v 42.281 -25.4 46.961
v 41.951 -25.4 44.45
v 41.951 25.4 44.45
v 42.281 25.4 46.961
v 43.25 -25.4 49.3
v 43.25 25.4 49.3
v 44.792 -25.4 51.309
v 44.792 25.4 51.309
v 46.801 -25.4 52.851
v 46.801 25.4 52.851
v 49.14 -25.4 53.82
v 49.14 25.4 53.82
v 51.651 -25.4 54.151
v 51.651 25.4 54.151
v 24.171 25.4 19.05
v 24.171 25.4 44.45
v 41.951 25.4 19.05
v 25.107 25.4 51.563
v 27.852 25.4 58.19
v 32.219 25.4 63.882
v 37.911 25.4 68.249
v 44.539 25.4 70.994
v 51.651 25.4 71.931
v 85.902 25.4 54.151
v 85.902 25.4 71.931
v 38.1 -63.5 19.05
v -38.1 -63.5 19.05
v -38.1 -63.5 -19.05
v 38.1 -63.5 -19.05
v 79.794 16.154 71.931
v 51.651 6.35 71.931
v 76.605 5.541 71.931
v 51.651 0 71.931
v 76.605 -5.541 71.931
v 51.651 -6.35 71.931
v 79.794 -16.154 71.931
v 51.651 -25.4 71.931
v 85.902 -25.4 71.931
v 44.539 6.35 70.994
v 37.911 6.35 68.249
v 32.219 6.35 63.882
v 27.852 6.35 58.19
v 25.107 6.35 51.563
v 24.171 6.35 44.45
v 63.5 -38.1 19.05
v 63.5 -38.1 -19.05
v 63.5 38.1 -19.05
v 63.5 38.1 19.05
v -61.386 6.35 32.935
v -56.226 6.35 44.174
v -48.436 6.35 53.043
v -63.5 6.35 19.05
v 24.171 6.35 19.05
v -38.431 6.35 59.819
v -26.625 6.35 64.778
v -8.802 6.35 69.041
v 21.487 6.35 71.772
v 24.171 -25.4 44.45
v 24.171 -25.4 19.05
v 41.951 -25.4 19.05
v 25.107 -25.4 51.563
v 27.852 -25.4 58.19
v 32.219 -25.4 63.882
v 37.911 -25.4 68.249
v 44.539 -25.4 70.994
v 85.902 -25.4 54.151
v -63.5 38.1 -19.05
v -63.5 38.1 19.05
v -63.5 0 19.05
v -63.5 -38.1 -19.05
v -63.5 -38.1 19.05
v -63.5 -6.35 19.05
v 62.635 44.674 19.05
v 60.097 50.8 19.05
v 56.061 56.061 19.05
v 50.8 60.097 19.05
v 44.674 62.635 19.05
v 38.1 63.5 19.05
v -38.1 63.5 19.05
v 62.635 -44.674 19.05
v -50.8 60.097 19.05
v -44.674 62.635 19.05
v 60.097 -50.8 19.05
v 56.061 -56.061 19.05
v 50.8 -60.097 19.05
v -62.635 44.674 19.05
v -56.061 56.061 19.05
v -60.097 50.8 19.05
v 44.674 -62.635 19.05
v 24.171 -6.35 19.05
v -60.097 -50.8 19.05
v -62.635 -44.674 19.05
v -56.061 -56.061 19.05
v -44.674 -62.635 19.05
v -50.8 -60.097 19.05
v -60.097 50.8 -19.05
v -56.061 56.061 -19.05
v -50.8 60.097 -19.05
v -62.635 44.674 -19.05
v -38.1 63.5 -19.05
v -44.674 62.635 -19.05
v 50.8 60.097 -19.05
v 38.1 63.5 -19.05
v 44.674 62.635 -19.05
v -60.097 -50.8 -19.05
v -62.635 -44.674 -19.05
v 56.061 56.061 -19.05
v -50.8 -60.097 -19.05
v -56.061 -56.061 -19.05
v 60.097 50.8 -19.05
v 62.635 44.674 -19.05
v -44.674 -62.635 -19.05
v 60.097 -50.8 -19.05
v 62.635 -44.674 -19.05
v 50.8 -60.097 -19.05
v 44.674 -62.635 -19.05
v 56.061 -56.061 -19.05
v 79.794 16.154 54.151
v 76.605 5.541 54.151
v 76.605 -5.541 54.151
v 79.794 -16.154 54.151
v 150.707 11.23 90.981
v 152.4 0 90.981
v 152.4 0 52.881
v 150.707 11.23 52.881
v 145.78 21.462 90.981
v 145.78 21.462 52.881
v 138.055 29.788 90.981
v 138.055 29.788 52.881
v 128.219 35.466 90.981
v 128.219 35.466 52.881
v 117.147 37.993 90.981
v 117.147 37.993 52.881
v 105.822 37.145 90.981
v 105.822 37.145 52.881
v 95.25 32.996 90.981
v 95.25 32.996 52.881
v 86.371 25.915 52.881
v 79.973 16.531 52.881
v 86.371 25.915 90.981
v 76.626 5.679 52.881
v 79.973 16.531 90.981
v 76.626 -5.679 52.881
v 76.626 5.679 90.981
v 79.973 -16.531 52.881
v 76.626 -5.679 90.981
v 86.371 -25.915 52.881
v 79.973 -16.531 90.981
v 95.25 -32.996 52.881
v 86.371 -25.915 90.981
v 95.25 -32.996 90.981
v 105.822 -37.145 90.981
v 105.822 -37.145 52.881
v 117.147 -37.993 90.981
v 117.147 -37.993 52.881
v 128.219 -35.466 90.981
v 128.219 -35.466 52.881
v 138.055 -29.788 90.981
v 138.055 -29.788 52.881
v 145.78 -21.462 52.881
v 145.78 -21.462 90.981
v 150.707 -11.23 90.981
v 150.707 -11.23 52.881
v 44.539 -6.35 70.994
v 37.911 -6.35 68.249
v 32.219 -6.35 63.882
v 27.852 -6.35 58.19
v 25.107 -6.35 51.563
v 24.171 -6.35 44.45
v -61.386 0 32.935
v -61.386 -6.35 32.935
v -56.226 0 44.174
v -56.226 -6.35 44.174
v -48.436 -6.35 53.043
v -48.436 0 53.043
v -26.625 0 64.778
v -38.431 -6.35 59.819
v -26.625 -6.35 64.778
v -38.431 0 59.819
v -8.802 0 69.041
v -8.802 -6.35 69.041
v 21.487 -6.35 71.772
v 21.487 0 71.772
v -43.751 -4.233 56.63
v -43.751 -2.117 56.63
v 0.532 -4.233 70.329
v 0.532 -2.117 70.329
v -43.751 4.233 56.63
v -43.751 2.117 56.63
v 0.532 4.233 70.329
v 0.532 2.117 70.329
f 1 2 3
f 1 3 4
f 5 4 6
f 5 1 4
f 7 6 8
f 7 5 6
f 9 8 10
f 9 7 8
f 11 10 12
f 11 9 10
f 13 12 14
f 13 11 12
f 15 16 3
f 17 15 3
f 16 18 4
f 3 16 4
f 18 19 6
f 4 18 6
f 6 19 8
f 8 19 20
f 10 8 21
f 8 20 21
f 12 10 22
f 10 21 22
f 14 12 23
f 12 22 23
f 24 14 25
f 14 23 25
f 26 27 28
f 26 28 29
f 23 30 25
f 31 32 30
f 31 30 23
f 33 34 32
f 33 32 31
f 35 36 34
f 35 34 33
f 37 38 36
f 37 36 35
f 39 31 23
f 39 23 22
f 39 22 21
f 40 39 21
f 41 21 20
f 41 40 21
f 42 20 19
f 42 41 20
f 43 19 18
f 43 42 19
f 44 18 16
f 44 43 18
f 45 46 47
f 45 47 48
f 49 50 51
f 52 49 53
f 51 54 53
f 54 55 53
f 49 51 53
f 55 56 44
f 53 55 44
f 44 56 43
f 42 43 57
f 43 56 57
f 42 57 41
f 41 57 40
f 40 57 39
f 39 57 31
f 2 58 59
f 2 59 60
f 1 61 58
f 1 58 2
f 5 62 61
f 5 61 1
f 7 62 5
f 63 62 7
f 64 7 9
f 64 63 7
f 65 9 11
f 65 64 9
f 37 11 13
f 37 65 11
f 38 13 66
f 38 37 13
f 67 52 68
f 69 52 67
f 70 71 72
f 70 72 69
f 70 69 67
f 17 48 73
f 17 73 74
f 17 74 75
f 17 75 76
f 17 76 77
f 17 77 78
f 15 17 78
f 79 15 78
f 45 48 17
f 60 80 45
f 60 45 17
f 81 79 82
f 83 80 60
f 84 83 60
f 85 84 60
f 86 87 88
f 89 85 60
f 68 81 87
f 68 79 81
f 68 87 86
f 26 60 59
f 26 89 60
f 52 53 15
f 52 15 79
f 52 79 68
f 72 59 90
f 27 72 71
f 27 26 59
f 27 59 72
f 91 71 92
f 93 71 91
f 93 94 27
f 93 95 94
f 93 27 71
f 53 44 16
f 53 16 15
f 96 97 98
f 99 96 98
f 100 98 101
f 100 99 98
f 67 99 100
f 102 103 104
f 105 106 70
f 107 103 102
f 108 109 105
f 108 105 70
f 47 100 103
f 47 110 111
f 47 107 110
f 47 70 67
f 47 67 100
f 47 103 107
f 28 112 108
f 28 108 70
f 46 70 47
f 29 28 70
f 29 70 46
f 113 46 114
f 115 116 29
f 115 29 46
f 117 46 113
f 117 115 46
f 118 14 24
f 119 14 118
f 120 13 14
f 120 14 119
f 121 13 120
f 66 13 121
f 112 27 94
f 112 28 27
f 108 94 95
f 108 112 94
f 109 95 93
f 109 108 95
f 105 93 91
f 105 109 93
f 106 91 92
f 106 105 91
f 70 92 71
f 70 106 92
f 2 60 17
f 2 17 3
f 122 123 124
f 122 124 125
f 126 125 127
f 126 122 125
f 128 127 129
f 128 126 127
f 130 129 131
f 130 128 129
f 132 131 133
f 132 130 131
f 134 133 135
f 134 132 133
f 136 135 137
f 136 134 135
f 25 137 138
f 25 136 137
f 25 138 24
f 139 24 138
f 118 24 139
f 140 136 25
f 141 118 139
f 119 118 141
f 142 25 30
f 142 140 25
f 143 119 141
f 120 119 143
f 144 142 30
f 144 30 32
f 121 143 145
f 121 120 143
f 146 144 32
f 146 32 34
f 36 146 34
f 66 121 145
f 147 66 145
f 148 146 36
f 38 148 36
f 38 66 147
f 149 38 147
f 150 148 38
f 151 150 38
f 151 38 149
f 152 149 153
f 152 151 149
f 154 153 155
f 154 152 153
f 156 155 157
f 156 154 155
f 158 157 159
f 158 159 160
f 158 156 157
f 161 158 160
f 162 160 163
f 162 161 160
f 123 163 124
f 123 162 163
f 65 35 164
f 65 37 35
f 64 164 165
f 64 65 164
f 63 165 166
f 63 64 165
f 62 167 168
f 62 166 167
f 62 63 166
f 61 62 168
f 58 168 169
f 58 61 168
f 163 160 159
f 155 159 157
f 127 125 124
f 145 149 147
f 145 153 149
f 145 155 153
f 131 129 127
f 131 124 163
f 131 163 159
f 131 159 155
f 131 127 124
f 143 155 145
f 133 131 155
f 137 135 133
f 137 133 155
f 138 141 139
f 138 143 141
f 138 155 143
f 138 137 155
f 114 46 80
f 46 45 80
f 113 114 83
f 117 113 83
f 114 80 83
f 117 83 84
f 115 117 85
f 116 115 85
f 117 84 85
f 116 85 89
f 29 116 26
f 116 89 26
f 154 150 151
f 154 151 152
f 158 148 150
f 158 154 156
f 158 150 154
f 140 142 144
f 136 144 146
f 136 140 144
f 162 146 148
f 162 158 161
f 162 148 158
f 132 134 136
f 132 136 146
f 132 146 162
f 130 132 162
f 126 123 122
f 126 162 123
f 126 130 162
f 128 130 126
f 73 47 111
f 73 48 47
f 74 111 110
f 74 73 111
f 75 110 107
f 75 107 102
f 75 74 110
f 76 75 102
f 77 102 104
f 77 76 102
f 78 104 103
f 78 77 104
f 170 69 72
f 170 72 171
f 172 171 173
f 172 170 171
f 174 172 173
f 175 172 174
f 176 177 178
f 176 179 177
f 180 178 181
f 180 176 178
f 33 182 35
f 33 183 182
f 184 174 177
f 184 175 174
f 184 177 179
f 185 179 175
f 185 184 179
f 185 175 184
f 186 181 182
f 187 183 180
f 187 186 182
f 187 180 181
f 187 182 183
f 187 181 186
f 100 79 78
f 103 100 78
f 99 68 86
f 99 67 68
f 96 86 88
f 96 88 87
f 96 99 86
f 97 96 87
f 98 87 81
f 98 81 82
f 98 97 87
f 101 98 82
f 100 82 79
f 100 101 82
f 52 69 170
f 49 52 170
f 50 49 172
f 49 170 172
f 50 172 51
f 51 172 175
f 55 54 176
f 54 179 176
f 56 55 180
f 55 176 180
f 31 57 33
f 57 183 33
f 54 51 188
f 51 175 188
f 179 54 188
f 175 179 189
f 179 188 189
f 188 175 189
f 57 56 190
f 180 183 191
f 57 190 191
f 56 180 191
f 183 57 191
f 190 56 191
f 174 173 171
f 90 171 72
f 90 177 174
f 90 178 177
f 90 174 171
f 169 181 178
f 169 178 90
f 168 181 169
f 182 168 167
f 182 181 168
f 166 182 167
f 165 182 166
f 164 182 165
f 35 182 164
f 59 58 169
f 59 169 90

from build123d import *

# Parameters (mm, degrees)
F1_DEPTH = 63.5
F2_DEPTH = 6.35
F0_W     = 38.1
F0_H     = 17.78
F3_DEPTH = 25.4
F5_R     = 25.4


with BuildPart() as f1:
    # F0 (on Front) → F1 (new body, symmetric)
    with BuildSketch(Plane.XZ):
        Polygon((63.5, -19.05), (63.5, 19.05), (41.950526, 19.05), (24.170526, 19.05), (-63.5, 19.05), (-63.5, -19.05), align=None)
    extrude(amount=F1_DEPTH, both=True)

    # F0 (on Front) → F2 (join, symmetric)
    with BuildSketch(Plane.XZ):
        with BuildLine():
            Line((-63.5, 19.05), (24.170526, 19.05))
            Line((24.170526, 19.05), (24.170526, 44.45))
            ThreePointArc((24.170526, 44.45), (32.219419, 63.881746), (51.651164, 71.930638))
            add(Edge.make_bspline(
                [(-63.5, 19.05), (-61.917547, 72.500213), (3.013055, 72.448058), (51.651164, 71.930638)],
                knots=[0, 0, 0, 0, 126.712874, 126.712874, 126.712874, 126.712874], degree=3))
        make_face()
    extrude(amount=F2_DEPTH, both=True)

    # F0 (on Front) → F3 (join, symmetric)
    with BuildSketch(Plane.XZ):
        with BuildLine():
            Line((24.170526, 19.05), (41.950526, 19.05))
            Line((41.950526, 19.05), (41.950526, 44.45))
            ThreePointArc((41.950526, 44.45), (44.791777, 51.309387), (51.651164, 54.150638))
            Line((51.651164, 54.150638), (76.2, 54.150638))
            Line((76.2, 54.150638), (76.2, 71.930638))
            Line((76.2, 71.930638), (51.651164, 71.930638))
            ThreePointArc((51.651164, 71.930638), (32.219419, 63.881746), (24.170526, 44.45))
            Line((24.170526, 44.45), (24.170526, 19.05))
        make_face()
        with Locations((95.25, 63.040638)):
            Rectangle(F0_W, F0_H)
    extrude(amount=F3_DEPTH, both=True)

    # F0 (on Front) → F4 (revolve)
    with BuildSketch(Plane.XZ):
        Polygon((114.3, 71.930638), (114.3, 54.150638), (114.3, 52.880638), (152.4, 52.880638), (152.4, 90.980638), (114.3, 90.980638), align=None)
    revolve(axis=Axis((114.3, 0, 71.930638), (0, 0, 1)))

    # F5
    f5_edges = [f1.edges().sort_by_distance(p)[0] for p in [
        (-63.5, -63.5, 0),
        (63.5, -63.5, 0),
        (-63.5, 63.5, 0),
        (63.5, 63.5, 0),
    ]]
    fillet(f5_edges, radius=F5_R)


solid = f1.part
